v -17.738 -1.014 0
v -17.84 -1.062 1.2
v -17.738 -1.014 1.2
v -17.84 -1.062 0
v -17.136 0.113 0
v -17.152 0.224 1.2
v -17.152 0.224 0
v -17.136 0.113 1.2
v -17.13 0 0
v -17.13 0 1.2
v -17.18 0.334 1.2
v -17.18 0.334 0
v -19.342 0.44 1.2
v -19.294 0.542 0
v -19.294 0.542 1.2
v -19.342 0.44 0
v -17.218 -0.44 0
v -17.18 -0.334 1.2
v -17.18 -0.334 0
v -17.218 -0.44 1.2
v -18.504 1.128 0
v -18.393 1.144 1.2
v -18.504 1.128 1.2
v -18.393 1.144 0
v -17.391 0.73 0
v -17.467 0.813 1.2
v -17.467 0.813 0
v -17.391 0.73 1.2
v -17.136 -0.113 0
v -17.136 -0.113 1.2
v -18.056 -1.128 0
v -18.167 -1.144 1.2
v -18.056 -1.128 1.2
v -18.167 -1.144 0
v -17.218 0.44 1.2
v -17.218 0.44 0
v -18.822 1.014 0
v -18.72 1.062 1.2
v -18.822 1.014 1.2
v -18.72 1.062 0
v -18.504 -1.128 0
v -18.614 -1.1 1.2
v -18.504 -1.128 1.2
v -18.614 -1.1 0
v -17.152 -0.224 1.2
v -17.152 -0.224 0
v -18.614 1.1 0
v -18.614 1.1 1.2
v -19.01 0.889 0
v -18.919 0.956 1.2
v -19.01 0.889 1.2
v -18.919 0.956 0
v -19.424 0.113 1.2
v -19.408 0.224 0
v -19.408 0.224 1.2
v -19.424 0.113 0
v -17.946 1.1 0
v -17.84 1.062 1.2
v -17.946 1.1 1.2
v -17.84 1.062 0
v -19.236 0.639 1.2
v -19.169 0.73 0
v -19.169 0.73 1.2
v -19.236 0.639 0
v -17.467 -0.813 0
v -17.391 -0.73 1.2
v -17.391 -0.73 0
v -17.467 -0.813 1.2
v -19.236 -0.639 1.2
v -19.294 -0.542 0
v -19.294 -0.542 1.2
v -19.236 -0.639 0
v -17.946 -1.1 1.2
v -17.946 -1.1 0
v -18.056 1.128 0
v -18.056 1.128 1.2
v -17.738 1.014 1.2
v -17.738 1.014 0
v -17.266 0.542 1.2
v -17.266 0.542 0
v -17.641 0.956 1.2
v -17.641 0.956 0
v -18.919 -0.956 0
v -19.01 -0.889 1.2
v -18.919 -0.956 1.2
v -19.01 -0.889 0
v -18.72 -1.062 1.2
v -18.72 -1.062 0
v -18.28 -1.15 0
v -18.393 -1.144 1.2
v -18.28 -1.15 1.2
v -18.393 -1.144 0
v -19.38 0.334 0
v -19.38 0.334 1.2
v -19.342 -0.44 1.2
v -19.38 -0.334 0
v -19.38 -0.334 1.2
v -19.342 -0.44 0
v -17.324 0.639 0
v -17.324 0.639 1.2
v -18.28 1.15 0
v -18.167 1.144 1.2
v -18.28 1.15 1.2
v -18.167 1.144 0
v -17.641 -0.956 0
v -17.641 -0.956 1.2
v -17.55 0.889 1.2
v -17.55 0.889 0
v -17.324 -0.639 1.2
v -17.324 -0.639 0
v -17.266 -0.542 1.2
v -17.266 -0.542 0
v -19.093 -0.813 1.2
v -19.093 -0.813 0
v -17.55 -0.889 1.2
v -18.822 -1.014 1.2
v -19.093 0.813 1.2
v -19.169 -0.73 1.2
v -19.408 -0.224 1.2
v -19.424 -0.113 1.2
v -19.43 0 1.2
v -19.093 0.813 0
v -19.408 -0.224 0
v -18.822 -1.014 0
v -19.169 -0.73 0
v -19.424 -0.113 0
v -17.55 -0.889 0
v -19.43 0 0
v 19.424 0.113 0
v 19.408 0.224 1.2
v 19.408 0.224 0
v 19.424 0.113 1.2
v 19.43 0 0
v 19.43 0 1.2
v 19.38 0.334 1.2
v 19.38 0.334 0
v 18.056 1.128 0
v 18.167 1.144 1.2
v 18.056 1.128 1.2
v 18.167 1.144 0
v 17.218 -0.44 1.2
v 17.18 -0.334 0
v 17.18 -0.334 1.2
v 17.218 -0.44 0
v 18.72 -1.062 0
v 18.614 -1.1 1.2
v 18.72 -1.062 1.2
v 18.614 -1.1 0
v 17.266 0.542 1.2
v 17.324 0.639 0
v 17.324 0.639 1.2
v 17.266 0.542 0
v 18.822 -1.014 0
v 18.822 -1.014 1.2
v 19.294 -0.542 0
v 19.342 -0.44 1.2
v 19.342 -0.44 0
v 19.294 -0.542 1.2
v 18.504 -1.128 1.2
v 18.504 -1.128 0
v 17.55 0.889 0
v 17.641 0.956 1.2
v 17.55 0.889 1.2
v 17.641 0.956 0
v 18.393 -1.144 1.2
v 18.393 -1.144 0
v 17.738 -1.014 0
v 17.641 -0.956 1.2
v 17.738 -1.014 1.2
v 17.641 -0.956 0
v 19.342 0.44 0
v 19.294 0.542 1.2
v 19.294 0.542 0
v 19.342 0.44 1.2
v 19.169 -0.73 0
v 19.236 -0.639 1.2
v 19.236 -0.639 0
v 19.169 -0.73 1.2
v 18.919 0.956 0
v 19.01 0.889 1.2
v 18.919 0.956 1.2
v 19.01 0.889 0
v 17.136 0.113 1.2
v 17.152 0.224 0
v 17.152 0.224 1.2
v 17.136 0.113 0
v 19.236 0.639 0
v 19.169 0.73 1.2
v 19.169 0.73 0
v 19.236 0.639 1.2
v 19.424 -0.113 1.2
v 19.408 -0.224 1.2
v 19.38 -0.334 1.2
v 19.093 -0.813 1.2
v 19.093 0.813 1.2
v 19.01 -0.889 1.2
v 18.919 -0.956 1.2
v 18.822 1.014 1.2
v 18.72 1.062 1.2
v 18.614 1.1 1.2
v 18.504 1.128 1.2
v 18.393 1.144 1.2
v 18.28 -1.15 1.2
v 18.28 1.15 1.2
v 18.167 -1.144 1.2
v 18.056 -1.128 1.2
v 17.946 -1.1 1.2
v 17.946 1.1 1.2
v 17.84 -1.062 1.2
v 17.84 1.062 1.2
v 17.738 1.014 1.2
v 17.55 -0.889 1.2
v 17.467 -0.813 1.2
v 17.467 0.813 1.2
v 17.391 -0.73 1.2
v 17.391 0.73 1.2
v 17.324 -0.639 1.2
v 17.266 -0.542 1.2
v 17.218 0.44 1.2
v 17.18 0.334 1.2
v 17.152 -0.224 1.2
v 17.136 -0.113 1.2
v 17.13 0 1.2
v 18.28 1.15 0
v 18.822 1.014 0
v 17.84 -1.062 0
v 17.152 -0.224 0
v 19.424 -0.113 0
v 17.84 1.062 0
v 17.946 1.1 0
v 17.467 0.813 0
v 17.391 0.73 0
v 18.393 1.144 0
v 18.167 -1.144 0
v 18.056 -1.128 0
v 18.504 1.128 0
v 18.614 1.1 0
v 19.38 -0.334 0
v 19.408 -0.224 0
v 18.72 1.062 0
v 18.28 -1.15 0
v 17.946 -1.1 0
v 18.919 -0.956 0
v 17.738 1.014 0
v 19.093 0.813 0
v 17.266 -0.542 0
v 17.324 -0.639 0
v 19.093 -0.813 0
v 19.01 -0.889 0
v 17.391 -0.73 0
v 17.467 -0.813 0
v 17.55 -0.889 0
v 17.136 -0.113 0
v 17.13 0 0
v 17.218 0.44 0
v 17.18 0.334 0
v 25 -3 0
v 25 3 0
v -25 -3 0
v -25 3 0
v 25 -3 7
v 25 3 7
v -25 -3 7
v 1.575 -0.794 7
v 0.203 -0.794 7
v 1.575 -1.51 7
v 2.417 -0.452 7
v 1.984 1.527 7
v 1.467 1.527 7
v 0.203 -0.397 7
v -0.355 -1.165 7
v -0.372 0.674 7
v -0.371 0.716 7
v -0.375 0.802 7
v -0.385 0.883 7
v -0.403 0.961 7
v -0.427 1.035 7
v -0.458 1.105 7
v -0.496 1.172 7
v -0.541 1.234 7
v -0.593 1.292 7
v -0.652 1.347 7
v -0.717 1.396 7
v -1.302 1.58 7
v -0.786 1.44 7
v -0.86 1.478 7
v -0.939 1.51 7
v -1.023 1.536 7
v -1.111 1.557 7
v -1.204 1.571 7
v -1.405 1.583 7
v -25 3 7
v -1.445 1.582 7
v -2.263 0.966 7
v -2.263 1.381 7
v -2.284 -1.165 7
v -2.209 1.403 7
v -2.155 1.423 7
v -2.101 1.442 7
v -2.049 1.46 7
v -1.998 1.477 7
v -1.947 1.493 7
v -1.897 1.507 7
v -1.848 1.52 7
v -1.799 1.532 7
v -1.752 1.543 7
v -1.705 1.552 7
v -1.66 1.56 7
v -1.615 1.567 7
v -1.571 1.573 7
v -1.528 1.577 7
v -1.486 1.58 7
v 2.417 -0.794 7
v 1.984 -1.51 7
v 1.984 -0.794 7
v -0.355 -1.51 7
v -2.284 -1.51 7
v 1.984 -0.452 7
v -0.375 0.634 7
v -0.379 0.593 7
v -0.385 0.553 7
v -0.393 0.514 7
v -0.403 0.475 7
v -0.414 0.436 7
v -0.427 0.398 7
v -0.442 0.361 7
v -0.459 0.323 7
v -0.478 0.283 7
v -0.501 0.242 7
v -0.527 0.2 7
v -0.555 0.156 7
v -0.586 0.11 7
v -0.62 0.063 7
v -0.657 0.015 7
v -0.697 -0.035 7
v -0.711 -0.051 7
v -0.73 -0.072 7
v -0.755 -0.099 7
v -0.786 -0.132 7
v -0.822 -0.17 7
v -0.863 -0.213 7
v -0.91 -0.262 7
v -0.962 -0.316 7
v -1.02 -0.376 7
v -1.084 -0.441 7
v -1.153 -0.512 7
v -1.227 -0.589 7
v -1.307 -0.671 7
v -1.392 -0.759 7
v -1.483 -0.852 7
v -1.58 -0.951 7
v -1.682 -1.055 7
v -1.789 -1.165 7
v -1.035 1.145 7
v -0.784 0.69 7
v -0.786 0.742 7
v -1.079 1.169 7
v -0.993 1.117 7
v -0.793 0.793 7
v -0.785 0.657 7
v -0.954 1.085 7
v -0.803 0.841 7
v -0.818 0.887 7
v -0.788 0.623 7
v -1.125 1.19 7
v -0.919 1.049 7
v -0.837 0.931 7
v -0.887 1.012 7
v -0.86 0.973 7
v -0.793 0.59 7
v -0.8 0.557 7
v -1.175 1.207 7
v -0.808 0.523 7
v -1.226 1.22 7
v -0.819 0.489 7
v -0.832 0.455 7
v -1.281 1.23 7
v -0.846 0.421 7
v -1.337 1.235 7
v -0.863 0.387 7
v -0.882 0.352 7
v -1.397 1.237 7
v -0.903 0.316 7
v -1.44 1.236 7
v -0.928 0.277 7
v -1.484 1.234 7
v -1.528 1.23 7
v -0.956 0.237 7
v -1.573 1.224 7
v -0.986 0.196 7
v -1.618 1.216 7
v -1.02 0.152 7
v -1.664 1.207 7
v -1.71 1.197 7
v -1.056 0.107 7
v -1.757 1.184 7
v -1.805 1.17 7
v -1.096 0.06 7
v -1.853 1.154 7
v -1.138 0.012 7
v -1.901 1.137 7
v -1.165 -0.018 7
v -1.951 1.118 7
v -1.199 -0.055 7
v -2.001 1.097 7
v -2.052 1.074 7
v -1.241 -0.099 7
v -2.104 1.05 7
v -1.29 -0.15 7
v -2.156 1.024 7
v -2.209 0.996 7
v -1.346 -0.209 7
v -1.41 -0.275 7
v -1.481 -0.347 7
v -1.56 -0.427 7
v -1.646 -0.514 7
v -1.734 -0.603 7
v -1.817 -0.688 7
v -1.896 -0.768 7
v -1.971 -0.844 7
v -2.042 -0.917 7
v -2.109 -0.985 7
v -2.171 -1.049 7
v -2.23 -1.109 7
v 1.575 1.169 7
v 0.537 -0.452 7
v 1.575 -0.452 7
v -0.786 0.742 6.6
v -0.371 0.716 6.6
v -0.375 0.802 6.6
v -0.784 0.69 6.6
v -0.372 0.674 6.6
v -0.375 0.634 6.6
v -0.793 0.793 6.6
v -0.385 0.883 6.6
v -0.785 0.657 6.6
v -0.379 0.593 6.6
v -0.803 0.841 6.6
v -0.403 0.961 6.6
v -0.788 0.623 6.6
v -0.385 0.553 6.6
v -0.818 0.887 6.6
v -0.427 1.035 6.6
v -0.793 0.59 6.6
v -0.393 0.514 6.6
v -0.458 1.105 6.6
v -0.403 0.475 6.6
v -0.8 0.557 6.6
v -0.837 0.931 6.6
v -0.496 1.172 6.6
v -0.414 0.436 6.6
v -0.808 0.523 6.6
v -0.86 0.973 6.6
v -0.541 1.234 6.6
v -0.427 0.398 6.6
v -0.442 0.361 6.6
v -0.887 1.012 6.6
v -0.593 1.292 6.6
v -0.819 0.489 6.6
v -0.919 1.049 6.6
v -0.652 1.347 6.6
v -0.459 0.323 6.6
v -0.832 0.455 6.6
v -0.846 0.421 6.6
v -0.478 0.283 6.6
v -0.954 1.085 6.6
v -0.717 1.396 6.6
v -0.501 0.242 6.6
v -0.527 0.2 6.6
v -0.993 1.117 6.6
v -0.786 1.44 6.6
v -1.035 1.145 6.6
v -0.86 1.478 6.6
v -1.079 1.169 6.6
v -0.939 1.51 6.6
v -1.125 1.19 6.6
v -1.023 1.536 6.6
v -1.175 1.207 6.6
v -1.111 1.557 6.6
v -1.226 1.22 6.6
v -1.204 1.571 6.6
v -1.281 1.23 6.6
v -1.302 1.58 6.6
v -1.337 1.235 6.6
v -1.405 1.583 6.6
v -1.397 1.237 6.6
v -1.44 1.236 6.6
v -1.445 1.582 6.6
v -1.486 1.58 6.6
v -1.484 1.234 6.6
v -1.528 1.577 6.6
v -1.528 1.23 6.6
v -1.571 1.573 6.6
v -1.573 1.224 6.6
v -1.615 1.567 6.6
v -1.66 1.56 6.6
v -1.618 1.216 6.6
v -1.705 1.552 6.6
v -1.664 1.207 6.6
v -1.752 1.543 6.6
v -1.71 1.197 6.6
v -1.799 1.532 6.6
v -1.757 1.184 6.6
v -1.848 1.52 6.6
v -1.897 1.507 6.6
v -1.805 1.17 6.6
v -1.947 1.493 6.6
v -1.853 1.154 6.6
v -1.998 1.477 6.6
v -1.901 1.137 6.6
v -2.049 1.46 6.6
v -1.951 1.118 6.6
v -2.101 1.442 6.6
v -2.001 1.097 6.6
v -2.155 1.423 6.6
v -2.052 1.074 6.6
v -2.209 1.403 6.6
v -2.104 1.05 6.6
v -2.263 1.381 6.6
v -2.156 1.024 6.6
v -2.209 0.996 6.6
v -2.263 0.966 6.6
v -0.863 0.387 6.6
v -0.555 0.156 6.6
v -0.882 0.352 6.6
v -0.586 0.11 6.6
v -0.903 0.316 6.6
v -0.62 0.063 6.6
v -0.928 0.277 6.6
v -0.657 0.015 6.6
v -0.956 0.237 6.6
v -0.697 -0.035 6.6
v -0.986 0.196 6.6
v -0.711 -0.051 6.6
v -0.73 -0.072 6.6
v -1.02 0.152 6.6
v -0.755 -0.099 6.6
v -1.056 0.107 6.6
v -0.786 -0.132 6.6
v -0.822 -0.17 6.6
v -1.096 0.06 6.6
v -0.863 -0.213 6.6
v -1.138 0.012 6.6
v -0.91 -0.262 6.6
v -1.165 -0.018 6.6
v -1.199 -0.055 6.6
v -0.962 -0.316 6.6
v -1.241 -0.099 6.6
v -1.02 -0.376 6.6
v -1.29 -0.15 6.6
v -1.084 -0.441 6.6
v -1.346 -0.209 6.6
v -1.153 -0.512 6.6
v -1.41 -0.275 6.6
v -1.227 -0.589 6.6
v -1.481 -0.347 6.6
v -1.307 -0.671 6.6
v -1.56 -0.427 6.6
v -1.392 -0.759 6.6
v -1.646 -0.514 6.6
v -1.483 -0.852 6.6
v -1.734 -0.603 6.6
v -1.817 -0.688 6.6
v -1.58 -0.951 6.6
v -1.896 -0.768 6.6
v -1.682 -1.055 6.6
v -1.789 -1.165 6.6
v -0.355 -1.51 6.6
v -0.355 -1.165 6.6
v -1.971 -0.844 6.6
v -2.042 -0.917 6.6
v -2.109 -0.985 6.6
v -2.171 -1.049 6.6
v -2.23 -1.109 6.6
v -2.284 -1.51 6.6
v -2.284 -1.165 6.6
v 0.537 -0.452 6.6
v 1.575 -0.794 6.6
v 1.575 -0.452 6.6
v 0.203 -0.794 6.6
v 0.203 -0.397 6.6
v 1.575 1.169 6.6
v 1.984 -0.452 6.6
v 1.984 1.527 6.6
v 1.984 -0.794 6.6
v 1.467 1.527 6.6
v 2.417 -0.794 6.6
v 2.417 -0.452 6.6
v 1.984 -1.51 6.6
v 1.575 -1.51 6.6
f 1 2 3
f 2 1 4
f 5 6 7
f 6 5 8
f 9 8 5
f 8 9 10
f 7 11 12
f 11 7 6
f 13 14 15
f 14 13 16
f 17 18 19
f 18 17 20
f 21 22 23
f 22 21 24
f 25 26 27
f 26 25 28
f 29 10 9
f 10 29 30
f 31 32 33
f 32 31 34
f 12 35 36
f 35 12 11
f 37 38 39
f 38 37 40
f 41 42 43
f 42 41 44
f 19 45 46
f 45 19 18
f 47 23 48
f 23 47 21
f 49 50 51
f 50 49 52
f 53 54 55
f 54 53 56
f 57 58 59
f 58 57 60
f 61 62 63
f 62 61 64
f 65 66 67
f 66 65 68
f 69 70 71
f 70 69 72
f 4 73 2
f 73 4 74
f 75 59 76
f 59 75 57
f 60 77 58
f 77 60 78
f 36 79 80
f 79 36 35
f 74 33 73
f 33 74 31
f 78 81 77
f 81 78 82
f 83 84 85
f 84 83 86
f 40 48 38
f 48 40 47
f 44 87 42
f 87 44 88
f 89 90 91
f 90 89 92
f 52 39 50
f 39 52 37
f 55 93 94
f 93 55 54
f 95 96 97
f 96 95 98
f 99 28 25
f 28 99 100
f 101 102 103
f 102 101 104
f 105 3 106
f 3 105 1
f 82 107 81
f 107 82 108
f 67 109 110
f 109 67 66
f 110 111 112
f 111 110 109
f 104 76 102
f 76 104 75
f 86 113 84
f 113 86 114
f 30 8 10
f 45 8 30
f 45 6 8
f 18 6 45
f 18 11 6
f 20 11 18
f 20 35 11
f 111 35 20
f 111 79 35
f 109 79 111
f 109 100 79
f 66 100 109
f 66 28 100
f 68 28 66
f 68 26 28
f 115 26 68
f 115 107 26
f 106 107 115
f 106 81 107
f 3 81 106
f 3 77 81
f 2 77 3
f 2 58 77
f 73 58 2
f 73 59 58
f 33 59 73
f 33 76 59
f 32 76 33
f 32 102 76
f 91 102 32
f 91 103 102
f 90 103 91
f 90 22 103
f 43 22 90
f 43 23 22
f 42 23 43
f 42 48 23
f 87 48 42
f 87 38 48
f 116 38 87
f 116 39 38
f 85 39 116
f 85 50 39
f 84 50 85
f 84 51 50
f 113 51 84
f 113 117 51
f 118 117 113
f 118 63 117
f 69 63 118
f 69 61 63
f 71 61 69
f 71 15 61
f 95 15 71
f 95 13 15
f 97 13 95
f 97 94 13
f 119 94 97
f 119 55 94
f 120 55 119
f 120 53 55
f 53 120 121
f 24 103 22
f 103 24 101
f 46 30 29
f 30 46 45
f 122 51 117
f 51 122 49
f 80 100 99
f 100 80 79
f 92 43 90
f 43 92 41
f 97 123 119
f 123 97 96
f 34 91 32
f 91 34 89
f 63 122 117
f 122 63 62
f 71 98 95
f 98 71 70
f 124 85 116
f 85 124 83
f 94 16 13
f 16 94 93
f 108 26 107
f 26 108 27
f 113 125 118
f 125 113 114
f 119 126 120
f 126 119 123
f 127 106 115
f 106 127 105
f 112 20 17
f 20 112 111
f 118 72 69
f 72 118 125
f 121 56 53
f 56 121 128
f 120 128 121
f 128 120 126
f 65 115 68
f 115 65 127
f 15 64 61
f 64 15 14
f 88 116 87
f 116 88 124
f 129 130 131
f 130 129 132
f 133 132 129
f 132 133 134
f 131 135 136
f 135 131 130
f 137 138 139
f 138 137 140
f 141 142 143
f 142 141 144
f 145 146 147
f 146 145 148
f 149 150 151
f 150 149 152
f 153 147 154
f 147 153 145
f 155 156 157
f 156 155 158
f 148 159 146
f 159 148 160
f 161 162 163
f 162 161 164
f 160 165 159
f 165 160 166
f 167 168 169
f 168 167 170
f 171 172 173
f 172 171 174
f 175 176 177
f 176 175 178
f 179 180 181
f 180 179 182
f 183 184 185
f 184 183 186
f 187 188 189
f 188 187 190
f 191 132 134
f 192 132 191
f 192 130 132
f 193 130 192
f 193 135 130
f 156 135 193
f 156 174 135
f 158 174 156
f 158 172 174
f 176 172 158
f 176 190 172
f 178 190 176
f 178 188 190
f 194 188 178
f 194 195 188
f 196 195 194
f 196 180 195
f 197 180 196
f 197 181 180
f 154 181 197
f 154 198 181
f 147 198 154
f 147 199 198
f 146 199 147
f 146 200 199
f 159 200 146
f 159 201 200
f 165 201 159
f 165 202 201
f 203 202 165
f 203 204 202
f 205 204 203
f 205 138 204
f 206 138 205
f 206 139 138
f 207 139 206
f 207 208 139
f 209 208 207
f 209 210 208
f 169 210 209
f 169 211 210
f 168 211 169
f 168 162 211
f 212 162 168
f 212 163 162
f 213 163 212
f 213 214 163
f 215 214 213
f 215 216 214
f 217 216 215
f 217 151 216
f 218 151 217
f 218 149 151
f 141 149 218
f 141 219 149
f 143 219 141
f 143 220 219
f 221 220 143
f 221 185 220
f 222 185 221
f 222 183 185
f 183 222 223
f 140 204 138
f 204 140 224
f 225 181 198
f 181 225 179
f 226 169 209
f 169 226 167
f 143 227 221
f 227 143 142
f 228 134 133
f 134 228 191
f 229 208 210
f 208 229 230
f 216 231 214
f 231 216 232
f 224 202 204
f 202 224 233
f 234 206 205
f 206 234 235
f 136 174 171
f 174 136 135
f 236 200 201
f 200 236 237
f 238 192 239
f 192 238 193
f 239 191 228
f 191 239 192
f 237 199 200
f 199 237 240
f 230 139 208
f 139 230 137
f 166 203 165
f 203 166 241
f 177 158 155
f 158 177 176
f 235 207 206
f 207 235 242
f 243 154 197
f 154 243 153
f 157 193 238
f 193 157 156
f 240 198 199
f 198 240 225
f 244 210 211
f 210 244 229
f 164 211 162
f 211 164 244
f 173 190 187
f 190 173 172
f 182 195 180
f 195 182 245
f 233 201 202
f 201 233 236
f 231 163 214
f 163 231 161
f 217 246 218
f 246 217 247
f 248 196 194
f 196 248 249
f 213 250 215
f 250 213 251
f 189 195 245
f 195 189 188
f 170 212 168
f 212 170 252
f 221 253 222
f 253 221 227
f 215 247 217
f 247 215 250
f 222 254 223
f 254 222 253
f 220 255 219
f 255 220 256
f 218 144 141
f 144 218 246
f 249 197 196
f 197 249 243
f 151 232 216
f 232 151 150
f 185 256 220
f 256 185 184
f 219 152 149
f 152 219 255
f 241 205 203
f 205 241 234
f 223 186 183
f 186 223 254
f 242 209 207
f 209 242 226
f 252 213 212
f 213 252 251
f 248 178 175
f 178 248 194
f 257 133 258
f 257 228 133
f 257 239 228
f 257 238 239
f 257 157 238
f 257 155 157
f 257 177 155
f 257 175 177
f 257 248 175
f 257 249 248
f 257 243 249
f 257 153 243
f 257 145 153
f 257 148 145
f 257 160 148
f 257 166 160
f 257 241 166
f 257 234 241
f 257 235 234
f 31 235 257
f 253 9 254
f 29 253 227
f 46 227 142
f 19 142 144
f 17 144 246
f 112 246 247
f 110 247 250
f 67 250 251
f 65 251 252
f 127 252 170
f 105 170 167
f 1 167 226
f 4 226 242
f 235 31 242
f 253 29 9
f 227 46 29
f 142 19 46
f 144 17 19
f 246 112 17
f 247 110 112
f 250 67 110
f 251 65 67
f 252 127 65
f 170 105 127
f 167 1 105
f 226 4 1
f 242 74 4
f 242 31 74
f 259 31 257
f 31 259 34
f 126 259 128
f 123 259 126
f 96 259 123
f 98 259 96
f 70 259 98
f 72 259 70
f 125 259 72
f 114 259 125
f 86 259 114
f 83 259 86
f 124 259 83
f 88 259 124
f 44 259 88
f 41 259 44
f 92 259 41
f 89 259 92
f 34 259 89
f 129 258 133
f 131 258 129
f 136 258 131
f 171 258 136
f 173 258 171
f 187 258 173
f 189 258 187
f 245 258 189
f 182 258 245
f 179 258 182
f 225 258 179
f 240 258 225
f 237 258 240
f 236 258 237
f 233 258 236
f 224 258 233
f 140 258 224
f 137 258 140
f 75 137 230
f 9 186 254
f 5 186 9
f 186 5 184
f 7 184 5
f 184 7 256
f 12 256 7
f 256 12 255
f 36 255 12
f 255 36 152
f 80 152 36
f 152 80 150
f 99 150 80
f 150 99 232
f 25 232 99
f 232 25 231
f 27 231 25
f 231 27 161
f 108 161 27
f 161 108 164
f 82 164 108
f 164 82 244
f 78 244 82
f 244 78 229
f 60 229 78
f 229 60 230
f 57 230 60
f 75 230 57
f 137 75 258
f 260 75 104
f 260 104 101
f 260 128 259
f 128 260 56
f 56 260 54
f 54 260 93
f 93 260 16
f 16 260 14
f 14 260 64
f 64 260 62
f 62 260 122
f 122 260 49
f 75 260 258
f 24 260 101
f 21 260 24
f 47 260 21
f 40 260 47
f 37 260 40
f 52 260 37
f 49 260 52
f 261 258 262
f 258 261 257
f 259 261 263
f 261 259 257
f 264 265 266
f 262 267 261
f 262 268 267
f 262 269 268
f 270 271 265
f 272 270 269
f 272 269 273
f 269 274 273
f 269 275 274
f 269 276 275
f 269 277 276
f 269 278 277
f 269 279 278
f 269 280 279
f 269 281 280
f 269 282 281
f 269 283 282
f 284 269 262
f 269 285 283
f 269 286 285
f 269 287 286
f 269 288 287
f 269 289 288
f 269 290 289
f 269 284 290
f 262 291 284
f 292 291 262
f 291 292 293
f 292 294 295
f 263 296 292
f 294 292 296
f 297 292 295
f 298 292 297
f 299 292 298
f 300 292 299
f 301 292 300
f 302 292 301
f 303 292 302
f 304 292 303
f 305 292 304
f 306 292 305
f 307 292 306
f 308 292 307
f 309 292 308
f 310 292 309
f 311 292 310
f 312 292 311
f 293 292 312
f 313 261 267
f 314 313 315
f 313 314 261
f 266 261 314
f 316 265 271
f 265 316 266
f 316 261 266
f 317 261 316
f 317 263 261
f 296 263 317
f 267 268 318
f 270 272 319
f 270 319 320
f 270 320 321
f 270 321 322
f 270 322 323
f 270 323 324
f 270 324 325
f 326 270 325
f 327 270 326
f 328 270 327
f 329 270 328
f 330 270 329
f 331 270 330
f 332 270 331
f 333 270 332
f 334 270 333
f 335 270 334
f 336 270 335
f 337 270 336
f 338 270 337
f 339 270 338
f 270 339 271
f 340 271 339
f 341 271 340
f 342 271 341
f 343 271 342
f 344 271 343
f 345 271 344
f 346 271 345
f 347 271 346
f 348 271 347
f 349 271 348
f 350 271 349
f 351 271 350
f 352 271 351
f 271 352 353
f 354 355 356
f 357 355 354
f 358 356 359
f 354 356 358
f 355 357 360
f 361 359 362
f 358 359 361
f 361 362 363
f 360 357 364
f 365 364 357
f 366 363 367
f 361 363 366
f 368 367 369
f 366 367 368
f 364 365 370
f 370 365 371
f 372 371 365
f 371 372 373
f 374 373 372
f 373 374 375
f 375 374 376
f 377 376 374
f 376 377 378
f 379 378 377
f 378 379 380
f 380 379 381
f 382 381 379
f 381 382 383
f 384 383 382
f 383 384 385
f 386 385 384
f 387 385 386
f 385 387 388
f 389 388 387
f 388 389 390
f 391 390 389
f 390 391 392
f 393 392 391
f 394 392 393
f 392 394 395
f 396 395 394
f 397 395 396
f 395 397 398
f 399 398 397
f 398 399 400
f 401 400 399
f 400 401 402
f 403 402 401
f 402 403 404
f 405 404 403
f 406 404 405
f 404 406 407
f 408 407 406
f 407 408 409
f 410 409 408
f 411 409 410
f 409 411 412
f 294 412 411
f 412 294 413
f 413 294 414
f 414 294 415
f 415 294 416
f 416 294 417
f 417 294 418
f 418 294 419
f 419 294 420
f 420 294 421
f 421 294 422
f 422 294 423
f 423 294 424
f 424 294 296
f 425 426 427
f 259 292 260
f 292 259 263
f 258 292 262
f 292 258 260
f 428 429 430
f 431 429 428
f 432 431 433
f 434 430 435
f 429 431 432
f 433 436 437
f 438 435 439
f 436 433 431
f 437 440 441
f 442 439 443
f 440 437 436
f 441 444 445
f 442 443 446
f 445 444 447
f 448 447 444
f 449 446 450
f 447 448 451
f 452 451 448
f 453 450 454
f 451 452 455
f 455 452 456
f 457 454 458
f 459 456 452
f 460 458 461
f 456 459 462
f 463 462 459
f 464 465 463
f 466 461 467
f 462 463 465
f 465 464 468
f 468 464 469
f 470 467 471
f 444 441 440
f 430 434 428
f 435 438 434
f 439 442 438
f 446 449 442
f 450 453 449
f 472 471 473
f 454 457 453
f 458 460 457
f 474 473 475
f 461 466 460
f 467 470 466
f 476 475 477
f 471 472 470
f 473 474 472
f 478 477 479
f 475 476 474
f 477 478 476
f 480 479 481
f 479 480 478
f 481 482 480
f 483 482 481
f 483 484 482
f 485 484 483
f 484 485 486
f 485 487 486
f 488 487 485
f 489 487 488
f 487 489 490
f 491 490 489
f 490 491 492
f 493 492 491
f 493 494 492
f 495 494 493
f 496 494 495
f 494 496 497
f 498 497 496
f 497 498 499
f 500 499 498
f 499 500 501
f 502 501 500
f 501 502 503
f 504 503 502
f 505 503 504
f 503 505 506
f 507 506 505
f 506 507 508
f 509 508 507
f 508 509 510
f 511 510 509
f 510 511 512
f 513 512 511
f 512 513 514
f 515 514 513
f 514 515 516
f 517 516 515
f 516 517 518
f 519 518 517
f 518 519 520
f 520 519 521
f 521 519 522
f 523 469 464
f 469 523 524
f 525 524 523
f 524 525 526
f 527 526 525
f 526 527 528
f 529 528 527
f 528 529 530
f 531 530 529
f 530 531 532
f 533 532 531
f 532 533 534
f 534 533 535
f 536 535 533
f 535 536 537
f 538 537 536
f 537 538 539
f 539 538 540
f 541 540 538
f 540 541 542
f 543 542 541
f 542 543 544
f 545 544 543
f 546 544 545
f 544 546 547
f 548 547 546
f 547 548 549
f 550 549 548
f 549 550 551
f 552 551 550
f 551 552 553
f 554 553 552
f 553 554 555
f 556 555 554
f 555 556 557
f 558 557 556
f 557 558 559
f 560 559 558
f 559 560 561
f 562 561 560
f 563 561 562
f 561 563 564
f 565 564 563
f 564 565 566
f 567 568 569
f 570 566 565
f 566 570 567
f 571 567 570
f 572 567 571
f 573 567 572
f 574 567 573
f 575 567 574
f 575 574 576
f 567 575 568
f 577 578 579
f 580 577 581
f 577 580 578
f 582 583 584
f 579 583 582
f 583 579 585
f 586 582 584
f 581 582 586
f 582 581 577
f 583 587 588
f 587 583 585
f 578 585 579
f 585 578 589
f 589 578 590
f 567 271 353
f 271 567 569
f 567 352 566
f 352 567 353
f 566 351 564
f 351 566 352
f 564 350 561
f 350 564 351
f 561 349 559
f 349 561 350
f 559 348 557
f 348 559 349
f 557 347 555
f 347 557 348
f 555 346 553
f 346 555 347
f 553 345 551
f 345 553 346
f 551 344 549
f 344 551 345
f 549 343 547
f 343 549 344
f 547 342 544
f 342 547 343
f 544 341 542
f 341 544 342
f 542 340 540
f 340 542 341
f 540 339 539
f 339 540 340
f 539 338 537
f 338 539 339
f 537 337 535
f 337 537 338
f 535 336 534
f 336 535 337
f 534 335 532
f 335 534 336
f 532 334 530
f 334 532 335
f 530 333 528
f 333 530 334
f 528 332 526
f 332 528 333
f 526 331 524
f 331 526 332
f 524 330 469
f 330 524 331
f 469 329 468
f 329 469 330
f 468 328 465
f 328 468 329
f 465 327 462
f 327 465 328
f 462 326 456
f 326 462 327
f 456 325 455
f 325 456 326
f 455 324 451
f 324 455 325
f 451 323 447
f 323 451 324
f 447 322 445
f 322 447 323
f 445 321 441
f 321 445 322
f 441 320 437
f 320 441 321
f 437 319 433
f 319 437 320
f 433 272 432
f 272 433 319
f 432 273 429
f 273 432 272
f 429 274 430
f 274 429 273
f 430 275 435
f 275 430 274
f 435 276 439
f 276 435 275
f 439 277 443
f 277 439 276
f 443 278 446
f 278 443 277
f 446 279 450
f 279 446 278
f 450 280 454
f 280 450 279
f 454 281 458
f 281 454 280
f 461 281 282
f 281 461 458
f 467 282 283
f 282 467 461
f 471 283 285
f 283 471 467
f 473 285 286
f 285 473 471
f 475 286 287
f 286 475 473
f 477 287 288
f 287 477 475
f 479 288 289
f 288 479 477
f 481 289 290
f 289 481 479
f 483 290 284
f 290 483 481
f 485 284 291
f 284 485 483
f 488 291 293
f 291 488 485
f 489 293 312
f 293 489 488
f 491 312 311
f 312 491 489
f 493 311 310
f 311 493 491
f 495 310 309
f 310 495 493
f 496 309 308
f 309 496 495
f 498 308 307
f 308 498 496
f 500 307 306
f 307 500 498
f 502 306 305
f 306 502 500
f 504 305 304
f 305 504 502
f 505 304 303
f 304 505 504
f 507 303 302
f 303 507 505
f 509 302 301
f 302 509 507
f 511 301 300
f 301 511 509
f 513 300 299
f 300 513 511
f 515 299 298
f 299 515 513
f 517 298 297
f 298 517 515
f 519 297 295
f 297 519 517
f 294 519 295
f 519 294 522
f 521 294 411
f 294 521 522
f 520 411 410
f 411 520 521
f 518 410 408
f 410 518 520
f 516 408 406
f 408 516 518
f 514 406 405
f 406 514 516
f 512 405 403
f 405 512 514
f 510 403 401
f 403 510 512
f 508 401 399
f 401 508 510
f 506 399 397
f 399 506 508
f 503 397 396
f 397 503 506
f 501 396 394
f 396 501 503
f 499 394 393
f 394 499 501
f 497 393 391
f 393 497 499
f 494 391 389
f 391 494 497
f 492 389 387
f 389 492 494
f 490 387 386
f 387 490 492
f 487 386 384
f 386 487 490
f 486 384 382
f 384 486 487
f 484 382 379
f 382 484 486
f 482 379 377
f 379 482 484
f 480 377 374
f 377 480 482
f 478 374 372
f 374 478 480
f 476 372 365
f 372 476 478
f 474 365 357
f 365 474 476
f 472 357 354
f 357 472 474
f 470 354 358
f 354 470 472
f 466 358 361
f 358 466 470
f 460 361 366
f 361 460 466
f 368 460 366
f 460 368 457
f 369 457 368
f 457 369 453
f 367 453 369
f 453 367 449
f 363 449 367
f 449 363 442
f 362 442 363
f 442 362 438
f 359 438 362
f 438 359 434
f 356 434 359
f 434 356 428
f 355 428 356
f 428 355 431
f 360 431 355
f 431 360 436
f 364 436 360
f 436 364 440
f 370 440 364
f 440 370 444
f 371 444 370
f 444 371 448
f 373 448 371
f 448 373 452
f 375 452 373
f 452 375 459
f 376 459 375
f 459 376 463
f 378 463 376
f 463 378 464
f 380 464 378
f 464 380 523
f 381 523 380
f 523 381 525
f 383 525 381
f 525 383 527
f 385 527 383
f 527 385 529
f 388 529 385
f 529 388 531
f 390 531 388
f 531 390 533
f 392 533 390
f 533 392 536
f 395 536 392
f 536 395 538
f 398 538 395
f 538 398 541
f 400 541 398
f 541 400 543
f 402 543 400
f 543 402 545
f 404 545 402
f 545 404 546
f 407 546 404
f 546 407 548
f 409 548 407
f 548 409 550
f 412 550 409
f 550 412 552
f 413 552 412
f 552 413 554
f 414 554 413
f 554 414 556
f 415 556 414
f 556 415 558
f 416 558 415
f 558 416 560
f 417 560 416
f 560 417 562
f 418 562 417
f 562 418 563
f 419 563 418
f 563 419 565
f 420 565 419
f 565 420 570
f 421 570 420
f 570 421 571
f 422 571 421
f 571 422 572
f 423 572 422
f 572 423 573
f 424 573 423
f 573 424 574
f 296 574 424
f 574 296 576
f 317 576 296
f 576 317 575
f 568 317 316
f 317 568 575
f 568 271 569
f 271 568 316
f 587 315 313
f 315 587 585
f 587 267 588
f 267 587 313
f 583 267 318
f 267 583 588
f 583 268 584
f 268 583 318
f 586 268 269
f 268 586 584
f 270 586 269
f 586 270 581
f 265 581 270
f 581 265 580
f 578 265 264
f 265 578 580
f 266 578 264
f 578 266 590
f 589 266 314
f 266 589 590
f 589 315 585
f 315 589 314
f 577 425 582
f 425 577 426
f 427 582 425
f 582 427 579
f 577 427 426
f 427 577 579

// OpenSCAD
// walls / wall — a straight interior wall segment: a square-ended slab standing a
// touch proud of the furniture, with its thickness engraved on top so a
// load-bearing wall reads apart from a partition (they differ only by how thick
// they are — see Thickness).
//
// Thickness/Length are the real-world wall size in cm. Interior thicknesses:
//   11.5       non-load-bearing partition (half-brick masonry)
//   17.5, 24   load-bearing interior walls
// Height is the one exception in the catalogue: it is a PRINTED height in mm, not a
// real one. Every piece of furniture is modelled at its real height and shrunk by
// the plan scale (see printed_h() in lib/common.scad), but a 250 cm wall at 1:40
// would be a 62.5 mm ribbon — you could not see into the room, and an opening would
// need a bridged lintel instead of the sill/threshold drop the segments use. So a
// wall is deliberately a low backdrop: it stands a little PROUD of the worktops and
// chests, and well short of the wardrobes, which still read against it.

include <../lib/common.scad>

Thickness = 24;   // cm — 11.5 partition, 17.5/24 load-bearing
Length    = 200;  // cm — segment length
Height    = 7;    // PRINTED mm — a low backdrop, not a scaled 250 cm wall

// Engrave the thickness on top (the number that tells a partition from a bearing
// wall). It is shrunk to fit the ribbon; a wall too thin or short for a legible
// number is left off with a warning. At 1:40 the load-bearing walls carry it
// (17.5 cm is 4.4 mm thick, 24 cm is 6) but the 11.5 cm partition — a 2.875 mm
// ribbon — does not: it comes out plain, and says so in the render log.
Show_label = true;

// Magnet pockets in the bottom face (0 = none). A wall is a thin ribbon — 2.875 mm
// across for the 11.5 cm partition, 6 for the 24 cm one — so at 1:40 the
// load-bearing walls drop to the small 2x1 disc and the partition is too thin for
// even that: it prints solid (magnets() picks; it says which in the render log).
// Along the length the count is clamped to what fits, so a short segment gets fewer.
Magnets = 2;

wall();

module wall() {
    difference() {
        // square ends (r = 0) so segments butt flush and corners meet cleanly
        footprint(Length, Thickness, Height, r = 0);
        if (Show_label) wall_label(Height);
        if (Magnets > 0) magnets(Length, Thickness, Magnets);
    }
}

// The thickness cut into the top face. Sized to the ribbon it has to fit — no
// taller than the wall is thick, no longer than the wall is long — and dropped
// when that falls below the legibility floor, so a short or thin wall comes out
// clean instead of blobbed (cf. the symbols in lib/common.scad).
module wall_label(top_z) {
    txt  = str(Thickness);
    h    = cm(Thickness) - 2 * Symbol_margin;      // room across the thickness
    w    = cm(Length)    - 2 * Symbol_margin;      // ... along the length
    size = min(Label_size, h, w / (0.7 * len(txt)));
    if (size >= Symbol_min)
        label(txt, top_z, size = size);
    else
        echo(str("WARNING: ", Thickness, "x", Length,
                 " cm wall at 1:", Scale, " is too thin to engrave its size"));
}
